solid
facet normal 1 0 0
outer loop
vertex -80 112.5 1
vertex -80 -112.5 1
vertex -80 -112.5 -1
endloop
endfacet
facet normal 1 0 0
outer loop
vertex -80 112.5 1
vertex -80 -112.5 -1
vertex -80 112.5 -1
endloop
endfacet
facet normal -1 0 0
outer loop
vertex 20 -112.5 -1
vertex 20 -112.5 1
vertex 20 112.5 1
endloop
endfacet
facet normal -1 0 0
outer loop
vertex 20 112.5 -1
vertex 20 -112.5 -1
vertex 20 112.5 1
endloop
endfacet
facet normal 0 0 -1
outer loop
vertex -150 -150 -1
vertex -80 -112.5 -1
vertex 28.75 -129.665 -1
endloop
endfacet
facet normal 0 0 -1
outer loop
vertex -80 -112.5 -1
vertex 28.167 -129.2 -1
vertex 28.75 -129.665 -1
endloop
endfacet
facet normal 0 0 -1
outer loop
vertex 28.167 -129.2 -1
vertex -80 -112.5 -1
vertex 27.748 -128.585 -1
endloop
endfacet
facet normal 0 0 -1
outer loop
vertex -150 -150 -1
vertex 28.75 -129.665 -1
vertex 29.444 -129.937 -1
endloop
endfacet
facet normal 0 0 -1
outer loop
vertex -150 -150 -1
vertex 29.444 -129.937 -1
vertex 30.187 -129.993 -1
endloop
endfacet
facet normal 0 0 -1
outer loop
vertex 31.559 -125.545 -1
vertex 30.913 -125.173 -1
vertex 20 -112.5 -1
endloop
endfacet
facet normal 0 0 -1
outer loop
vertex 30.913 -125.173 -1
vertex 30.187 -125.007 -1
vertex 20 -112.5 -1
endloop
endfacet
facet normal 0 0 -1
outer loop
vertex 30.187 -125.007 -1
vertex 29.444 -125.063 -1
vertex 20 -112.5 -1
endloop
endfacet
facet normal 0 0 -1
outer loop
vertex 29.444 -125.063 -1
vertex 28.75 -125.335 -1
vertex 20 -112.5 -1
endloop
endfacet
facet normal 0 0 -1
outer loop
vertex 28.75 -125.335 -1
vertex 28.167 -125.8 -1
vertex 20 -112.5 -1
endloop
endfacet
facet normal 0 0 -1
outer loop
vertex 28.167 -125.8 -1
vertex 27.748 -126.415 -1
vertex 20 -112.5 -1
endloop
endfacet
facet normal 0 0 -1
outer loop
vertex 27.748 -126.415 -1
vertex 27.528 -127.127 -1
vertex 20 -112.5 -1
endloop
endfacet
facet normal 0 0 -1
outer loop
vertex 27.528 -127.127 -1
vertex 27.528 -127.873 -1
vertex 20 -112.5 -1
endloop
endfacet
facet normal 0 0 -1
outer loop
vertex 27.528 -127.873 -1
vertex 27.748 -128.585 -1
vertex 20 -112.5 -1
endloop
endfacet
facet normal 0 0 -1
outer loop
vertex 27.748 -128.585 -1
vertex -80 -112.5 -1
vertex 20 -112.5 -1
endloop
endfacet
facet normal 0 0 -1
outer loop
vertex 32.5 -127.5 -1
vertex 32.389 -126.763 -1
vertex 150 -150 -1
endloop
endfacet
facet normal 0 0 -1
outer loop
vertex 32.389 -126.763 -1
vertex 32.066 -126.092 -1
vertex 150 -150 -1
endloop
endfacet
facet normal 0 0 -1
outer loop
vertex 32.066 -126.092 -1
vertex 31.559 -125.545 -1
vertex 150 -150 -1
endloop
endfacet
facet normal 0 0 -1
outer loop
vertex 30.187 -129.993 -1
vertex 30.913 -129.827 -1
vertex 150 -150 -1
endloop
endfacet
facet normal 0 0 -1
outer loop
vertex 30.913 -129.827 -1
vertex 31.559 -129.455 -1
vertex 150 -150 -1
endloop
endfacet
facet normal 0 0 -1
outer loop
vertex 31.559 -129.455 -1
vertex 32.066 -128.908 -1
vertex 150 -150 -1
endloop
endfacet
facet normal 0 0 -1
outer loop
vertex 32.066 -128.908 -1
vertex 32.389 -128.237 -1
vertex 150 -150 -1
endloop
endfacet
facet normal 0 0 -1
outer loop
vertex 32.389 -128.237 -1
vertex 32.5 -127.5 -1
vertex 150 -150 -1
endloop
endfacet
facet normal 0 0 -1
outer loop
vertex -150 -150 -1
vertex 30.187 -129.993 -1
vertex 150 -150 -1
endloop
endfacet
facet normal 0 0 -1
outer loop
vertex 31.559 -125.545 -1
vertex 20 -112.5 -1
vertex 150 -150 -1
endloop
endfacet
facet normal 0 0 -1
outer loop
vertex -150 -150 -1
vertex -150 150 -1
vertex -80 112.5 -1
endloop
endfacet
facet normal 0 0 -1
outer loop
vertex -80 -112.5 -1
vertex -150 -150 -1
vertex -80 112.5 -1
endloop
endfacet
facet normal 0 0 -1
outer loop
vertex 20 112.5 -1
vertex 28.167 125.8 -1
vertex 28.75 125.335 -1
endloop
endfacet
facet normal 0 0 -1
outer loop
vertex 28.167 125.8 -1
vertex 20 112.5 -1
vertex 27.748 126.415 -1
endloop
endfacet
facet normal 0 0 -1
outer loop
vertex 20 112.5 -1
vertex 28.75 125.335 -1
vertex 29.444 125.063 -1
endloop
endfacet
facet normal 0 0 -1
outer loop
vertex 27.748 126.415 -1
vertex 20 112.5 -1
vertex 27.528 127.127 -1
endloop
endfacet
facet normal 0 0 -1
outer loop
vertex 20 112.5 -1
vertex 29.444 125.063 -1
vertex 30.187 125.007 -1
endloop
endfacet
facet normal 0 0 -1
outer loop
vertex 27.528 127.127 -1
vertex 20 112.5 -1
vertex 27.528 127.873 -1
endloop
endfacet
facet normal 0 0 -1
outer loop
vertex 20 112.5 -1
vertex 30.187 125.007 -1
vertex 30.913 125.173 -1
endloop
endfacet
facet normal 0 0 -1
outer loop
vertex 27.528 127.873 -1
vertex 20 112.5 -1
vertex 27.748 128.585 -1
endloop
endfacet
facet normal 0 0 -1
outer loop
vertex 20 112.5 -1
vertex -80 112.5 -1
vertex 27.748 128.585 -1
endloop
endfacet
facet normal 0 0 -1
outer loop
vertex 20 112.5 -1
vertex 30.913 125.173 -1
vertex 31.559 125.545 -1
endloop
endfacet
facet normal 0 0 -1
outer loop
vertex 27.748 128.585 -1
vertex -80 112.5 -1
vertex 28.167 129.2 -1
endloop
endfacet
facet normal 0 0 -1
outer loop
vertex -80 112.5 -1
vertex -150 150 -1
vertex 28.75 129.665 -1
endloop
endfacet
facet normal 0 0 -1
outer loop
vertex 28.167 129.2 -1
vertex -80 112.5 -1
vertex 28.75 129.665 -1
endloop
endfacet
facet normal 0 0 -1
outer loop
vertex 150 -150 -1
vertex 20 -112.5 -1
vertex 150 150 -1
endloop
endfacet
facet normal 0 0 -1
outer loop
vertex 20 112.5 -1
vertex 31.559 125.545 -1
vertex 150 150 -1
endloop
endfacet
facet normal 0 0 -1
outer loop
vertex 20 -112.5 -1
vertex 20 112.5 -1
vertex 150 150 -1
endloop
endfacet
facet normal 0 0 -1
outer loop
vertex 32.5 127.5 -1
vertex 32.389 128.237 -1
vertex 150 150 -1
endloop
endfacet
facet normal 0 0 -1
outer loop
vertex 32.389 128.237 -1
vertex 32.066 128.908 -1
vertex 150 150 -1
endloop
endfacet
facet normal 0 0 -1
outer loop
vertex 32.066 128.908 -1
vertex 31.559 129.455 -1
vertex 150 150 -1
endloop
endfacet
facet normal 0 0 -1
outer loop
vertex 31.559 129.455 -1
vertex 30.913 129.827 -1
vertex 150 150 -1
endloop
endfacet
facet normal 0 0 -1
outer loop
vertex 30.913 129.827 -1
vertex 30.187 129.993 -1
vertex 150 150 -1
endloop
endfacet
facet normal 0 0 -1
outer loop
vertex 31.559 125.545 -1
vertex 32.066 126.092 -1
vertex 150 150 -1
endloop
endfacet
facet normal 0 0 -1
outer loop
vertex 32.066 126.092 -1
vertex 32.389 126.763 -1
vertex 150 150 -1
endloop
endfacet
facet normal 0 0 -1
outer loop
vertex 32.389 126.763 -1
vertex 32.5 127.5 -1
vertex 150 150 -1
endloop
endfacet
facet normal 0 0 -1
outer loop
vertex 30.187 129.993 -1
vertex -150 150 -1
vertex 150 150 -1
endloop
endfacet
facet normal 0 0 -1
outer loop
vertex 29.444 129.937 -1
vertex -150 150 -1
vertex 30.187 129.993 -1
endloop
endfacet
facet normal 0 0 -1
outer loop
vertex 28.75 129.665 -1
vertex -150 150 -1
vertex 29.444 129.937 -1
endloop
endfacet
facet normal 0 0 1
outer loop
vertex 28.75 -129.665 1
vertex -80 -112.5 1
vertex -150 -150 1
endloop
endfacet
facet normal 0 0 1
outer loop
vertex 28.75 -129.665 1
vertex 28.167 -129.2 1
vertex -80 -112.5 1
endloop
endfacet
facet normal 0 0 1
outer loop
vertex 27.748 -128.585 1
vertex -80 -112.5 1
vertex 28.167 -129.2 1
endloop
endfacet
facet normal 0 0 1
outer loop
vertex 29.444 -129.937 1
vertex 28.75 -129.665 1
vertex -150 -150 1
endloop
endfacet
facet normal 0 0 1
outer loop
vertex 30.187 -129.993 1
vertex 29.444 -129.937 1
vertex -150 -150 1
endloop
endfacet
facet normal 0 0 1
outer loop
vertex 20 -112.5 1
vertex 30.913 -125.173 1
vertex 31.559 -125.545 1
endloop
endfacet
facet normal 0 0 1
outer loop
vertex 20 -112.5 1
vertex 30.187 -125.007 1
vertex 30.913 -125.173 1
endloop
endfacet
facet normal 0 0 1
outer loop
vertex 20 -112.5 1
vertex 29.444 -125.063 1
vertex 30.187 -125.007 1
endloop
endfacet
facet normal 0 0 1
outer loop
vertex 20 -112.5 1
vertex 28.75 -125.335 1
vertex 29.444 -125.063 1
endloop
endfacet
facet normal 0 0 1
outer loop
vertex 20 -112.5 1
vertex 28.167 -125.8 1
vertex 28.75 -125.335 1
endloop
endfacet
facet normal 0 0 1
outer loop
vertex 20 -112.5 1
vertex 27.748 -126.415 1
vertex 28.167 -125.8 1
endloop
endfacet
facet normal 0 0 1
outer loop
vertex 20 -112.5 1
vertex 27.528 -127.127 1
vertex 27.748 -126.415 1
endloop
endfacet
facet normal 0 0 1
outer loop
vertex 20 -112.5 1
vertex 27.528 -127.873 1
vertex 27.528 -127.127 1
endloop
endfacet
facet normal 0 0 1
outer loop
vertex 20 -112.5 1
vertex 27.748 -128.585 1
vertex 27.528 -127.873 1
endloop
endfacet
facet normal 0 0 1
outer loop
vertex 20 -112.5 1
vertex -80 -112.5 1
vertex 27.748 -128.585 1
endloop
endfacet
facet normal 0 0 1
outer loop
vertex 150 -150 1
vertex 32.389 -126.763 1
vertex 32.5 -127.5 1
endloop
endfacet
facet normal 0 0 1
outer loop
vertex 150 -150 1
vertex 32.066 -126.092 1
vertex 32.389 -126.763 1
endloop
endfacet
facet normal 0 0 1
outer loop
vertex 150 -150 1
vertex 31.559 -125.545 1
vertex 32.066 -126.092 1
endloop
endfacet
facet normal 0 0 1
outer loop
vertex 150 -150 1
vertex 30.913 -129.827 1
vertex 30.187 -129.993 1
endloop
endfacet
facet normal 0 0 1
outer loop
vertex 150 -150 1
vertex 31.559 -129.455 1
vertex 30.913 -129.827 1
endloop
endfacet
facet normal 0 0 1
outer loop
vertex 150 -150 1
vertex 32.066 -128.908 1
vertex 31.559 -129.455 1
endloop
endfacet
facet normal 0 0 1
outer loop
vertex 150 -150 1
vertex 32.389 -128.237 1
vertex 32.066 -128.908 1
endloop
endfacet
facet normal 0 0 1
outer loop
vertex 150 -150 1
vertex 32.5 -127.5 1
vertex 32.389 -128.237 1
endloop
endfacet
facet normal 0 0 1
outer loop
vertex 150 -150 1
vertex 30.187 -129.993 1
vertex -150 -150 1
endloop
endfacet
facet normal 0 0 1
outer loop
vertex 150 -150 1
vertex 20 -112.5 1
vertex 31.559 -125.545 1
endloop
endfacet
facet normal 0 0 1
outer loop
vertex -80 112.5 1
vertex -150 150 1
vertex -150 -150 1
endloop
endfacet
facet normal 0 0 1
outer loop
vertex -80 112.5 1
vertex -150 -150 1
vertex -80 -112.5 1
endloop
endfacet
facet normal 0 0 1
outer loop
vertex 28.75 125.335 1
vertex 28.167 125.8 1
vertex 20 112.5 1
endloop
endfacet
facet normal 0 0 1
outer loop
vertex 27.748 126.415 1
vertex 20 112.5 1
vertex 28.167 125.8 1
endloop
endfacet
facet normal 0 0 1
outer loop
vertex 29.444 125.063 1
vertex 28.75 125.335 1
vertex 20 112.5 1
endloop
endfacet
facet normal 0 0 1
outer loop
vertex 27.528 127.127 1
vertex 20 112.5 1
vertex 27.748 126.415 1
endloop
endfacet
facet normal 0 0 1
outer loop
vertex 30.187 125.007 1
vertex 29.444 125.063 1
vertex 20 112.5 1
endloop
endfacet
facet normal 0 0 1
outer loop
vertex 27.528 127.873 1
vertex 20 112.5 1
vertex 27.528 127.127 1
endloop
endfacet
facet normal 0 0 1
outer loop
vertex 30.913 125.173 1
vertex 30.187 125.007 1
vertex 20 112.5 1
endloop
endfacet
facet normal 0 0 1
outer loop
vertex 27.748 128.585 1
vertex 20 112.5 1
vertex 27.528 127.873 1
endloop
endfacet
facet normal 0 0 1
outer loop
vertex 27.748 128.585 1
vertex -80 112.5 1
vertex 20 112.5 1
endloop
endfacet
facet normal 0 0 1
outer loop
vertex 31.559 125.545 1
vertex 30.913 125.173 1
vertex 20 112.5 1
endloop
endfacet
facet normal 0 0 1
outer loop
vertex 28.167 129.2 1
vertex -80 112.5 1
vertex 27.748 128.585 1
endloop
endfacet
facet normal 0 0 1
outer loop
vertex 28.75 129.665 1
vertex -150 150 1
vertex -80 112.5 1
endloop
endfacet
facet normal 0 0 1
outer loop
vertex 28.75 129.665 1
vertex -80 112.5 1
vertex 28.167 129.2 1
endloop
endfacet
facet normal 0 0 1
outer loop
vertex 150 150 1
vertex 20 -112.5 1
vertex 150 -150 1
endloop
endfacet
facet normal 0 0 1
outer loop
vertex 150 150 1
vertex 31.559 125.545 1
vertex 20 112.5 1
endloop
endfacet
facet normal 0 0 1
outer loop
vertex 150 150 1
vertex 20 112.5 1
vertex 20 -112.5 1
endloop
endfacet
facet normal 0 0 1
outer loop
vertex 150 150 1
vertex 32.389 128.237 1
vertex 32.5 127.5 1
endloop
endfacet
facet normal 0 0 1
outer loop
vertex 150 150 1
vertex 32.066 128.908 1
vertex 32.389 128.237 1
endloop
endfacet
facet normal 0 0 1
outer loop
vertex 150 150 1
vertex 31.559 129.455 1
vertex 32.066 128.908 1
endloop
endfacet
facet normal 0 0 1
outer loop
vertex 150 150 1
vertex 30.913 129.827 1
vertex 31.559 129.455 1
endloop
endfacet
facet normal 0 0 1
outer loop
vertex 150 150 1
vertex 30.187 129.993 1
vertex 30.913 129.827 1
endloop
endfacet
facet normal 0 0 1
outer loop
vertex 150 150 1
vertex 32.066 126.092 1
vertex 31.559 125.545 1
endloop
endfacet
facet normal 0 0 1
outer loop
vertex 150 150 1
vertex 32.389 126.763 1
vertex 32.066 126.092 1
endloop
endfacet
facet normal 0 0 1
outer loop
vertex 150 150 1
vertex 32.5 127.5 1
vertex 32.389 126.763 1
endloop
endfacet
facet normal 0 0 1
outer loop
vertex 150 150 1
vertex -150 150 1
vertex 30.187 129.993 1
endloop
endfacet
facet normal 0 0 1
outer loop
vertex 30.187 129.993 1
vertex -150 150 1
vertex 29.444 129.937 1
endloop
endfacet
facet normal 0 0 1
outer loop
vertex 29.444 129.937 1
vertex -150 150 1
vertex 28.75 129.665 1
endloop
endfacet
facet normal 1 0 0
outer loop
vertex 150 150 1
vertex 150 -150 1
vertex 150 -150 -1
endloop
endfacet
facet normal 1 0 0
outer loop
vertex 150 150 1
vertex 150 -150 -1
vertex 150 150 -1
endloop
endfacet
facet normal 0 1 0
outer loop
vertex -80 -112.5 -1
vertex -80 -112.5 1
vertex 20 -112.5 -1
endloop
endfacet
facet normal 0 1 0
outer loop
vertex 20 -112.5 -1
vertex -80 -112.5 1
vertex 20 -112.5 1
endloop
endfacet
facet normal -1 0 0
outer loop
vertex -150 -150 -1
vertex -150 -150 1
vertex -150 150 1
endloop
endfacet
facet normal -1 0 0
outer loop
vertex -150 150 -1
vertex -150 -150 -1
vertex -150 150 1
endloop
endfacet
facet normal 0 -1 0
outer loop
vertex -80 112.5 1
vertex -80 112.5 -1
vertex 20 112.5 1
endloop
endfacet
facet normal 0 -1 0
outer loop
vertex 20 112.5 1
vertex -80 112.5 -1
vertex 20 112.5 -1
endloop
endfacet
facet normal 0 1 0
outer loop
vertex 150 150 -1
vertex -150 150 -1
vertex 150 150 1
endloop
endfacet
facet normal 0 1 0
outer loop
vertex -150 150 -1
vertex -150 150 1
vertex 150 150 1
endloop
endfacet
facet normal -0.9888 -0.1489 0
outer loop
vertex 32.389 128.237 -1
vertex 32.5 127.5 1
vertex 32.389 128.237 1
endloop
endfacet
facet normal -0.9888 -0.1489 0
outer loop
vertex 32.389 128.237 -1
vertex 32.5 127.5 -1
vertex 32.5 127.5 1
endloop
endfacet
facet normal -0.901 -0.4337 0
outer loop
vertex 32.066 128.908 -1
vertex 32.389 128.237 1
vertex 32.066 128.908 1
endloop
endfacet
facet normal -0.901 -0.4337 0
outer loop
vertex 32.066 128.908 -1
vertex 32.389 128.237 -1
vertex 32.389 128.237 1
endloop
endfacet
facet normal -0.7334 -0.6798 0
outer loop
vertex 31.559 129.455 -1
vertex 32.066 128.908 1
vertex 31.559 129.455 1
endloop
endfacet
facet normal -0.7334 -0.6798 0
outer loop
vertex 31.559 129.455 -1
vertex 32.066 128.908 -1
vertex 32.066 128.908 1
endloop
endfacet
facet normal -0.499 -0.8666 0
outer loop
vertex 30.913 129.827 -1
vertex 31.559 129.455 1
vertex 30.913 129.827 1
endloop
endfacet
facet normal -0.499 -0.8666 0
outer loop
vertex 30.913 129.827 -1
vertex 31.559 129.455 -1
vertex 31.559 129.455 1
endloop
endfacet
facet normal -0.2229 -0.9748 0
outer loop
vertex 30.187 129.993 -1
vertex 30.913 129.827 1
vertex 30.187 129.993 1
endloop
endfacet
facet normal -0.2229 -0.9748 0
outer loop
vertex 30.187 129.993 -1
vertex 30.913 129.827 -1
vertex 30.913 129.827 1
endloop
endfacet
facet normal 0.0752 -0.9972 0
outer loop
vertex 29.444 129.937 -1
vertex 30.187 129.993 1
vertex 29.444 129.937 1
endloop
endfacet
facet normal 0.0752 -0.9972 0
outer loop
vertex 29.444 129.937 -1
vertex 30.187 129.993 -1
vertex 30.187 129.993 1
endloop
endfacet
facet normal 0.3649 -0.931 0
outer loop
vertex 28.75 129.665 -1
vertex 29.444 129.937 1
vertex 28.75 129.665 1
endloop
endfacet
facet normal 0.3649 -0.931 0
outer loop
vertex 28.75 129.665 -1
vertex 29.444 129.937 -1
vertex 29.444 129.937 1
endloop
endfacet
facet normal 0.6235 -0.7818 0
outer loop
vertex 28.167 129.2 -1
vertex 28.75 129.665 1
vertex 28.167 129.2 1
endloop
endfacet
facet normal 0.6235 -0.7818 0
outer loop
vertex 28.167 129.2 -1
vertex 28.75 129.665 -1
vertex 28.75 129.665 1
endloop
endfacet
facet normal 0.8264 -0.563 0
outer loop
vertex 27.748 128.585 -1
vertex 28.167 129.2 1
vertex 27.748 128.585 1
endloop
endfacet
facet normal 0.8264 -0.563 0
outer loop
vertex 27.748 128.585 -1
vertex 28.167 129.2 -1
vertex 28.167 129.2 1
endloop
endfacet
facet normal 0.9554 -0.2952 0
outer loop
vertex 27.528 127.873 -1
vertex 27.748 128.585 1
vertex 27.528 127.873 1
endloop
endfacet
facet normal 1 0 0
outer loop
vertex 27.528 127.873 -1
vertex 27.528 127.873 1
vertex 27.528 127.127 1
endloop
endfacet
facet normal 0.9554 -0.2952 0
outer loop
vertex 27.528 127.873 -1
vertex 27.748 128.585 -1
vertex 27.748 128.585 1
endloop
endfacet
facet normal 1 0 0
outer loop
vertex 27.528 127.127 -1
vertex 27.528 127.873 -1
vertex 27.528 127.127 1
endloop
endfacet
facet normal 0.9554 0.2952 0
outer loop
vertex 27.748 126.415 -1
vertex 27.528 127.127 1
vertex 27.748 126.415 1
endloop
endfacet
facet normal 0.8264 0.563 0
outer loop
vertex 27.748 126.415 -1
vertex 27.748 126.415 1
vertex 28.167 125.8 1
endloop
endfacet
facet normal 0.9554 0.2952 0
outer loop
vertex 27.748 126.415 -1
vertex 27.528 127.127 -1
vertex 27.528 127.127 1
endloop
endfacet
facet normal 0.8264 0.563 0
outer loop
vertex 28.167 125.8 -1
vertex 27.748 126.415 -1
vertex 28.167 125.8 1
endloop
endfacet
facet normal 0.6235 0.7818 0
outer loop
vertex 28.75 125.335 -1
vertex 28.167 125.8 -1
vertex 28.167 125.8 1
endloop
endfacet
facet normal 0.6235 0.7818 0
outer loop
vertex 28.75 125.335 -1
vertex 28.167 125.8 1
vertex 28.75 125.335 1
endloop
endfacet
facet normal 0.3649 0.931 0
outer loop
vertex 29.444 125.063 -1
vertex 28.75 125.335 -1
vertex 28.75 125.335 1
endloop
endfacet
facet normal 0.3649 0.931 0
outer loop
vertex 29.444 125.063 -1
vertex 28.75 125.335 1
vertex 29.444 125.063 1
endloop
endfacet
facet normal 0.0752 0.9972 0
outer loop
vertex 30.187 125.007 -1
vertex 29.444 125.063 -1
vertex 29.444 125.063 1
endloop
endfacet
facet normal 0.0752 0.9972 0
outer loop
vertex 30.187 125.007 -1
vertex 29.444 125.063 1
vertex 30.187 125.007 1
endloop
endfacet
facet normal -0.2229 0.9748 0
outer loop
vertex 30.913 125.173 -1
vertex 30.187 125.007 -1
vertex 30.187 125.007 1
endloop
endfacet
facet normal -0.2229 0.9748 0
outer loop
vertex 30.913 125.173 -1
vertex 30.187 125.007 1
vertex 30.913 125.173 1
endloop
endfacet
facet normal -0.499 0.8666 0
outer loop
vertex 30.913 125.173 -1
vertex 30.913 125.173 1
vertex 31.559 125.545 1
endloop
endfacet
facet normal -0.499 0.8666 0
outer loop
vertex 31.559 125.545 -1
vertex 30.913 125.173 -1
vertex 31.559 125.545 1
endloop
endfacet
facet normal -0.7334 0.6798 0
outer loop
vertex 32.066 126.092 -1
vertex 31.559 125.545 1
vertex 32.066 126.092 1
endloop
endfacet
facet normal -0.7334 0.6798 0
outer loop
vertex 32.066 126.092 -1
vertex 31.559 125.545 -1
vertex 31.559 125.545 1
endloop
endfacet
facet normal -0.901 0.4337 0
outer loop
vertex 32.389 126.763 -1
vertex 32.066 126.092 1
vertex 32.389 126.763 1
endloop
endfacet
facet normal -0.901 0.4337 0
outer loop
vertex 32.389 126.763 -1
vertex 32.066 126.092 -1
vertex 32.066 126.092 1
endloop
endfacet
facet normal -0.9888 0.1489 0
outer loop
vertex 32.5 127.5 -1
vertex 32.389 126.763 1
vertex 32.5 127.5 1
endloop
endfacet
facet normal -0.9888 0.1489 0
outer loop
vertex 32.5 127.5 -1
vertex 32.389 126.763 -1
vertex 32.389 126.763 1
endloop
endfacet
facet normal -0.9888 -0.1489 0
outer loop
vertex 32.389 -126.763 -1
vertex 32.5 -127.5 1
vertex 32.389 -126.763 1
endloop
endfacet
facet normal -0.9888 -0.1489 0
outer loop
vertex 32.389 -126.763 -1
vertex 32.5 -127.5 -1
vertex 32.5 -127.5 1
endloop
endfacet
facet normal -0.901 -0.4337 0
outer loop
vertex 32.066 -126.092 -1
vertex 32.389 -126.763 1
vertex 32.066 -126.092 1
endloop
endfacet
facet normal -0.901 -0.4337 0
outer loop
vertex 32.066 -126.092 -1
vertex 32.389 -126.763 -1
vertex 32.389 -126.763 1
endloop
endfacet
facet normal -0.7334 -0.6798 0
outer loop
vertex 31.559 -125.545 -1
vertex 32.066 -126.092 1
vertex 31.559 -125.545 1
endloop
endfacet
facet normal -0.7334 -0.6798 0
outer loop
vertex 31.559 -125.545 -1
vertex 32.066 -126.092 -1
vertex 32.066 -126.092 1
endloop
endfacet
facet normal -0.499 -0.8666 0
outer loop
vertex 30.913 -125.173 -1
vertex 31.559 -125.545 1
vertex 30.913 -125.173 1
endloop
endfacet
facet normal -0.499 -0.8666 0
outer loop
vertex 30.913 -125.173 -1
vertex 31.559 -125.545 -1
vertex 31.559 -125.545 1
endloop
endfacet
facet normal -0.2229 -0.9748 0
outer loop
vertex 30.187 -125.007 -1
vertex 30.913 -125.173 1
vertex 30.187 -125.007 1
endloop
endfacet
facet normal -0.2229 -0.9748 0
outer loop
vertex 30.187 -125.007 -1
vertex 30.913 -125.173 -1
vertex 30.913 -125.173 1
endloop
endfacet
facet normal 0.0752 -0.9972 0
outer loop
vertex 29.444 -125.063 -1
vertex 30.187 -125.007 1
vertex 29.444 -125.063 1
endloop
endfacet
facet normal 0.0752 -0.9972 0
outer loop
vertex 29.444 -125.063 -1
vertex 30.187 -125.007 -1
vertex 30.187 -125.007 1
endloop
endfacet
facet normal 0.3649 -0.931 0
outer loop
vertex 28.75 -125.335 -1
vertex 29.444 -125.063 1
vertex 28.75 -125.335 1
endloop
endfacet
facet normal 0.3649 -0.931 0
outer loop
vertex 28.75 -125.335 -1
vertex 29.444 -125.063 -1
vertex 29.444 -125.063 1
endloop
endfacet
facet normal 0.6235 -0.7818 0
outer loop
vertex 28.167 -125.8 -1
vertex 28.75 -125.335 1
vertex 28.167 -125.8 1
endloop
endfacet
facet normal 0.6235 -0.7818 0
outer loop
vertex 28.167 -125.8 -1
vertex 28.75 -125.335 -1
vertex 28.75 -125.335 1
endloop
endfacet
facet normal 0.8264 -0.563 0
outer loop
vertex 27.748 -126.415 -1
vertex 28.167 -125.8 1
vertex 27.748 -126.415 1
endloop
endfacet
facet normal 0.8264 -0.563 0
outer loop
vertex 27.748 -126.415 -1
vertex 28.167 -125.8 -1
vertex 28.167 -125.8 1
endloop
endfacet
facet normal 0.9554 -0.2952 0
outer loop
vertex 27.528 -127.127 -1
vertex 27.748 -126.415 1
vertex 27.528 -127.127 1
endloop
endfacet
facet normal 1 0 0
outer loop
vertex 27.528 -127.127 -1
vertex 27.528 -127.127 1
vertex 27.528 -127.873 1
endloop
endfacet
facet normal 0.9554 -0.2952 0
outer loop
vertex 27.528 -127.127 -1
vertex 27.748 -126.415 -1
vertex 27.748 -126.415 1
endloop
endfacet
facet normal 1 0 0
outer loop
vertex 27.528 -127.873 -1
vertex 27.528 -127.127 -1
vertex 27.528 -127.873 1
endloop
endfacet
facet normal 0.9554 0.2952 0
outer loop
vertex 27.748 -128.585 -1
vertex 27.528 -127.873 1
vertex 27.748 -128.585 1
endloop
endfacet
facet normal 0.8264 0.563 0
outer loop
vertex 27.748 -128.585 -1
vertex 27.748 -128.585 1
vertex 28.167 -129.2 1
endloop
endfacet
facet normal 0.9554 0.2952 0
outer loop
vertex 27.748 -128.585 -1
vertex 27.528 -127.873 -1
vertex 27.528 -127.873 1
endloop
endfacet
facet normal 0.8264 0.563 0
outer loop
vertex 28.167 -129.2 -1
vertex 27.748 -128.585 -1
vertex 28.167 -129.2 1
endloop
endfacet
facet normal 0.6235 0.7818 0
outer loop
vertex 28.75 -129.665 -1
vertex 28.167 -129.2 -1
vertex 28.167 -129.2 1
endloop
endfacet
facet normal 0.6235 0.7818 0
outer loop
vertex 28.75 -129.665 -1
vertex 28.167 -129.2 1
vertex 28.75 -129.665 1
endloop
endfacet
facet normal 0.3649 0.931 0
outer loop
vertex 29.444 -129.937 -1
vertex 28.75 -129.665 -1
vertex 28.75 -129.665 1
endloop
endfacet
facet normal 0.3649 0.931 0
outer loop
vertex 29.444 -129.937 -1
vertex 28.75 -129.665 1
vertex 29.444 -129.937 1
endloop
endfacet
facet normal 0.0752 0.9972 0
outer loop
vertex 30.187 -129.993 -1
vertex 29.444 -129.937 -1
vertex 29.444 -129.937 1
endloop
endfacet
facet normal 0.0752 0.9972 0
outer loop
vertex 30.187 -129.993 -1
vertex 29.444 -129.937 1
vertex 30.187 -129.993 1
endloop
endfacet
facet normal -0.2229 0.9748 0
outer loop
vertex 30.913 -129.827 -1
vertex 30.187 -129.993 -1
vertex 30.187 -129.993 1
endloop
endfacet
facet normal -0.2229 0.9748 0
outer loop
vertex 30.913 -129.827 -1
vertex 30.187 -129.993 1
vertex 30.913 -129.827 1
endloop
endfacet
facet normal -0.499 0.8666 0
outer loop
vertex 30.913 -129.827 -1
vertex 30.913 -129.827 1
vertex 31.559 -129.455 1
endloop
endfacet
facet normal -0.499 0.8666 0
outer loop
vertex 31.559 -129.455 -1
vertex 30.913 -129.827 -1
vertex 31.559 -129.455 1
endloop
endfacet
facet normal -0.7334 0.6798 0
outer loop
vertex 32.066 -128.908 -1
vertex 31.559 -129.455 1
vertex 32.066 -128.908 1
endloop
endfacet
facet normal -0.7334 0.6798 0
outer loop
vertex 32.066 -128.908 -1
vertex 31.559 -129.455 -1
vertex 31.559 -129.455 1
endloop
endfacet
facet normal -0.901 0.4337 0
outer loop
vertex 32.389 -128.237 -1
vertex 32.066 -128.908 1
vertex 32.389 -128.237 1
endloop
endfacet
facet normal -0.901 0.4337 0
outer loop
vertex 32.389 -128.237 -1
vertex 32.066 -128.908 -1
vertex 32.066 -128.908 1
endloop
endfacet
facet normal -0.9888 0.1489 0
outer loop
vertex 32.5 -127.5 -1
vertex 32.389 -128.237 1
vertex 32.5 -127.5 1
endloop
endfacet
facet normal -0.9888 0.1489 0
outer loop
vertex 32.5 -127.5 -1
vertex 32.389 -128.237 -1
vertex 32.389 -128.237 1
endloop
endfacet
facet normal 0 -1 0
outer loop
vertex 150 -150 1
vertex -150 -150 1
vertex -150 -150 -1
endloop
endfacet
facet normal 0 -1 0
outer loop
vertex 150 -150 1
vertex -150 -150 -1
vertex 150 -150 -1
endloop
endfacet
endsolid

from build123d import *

# Parameters (mm, degrees)
F0_W     = 300
F0_H     = 300
F0_R     = 2.5
F0_W_2   = 100
F0_H_2   = 225
F1_DEPTH = 1


with BuildPart() as f1:
    # F0 (on Top) → F1 (new body, symmetric)
    with BuildSketch(Plane.XY):
        Rectangle(F0_W, F0_H)
        with Locations((30, -127.5)):
            Circle(F0_R, mode=Mode.SUBTRACT)
        with Locations((-30, 0)):
            Rectangle(F0_W_2, F0_H_2, mode=Mode.SUBTRACT)
        with Locations((30, 127.5)):
            Circle(F0_R, mode=Mode.SUBTRACT)
    extrude(amount=F1_DEPTH, both=True)


solid = f1.part
